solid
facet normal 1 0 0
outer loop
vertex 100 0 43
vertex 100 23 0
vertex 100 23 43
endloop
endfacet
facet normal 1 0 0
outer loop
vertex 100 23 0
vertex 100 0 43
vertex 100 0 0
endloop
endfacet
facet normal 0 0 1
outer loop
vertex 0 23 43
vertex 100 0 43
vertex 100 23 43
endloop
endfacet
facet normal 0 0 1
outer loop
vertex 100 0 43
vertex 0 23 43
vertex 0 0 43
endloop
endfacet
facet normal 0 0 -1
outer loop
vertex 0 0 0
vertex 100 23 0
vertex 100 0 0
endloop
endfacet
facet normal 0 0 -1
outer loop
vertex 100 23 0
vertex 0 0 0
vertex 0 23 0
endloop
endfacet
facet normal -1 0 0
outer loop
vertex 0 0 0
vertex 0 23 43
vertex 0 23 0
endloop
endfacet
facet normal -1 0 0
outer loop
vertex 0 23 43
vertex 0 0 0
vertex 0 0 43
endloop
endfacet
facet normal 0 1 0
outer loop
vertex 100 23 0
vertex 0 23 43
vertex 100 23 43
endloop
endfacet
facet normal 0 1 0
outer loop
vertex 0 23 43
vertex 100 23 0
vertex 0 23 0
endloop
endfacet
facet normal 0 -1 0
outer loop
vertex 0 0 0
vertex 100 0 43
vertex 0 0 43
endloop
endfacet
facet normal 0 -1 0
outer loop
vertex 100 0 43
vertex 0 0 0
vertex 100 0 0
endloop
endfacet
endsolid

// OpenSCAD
monitor_thickness = 39;
wall_thickness = 4;
bezel_height = 19;
// 4 total inches
total_length = 100;
// 2 inches
midway = total_length / 2;

difference(){
    cube([total_length, bezel_height + wall_thickness, monitor_thickness + wall_thickness]);
    //translate([0,2,0])cube([total_length - midway, bezel_height, monitor_thickness]);
    //translate([midway,0,0])cube([0, 20, monitor_thickness+wall_thickness+wall_thickness]);
    translate([midway,0,0])cube([0, 20
    , 80]);
}
